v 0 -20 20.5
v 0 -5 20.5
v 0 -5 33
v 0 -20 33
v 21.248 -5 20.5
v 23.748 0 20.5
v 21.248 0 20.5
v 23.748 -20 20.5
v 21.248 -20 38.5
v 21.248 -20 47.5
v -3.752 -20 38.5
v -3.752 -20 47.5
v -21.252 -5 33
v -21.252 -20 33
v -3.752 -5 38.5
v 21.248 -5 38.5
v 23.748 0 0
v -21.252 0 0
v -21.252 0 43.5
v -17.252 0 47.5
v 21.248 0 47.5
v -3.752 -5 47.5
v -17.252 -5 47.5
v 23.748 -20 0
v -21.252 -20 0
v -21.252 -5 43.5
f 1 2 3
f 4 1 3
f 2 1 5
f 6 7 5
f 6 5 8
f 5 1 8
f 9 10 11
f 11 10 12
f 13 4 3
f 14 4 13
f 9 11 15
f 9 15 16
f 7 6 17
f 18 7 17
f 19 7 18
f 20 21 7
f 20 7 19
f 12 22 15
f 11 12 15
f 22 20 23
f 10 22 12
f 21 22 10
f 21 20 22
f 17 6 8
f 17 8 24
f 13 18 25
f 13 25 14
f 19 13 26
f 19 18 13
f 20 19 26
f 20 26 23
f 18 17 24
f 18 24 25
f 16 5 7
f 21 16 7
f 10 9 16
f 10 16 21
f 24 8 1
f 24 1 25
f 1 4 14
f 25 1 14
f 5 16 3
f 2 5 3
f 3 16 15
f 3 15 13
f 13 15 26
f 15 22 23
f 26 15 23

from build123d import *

# Parameters (mm, degrees)
PAD_DEPTH       = 20
SKETCH001_W     = 2.5
SKETCH001_H     = 27
POCKET_DEPTH    = 20.001
POCKET001_DEPTH = 15


with BuildPart() as part:
    # Sketch → Pad (new body)
    with BuildSketch(Plane.XZ):
        Polygon((23.748329, 0), (-21.251671, 0), (-21.251671, 43.5), (-17.251671, 47.5), (23.748329, 47.5), align=None)
    extrude(amount=PAD_DEPTH)

    # Sketch001 → Pocket (cut, through all)
    with BuildSketch(Plane.XZ.offset(20)):
        with Locations((22.498329, 34)):
            Rectangle(SKETCH001_W, SKETCH001_H)
    extrude(amount=-POCKET_DEPTH, mode=Mode.SUBTRACT)

    # Sketch002 → Pocket001 (cut)
    with BuildSketch(Plane.XZ.offset(20)):
        Polygon((21.248329, 20.5), (0, 20.5), (0, 33), (-21.251671, 33), (-21.251671, 47.5), (-3.751671, 47.5), (-3.751671, 38.5), (21.248329, 38.5), align=None)
    extrude(amount=-POCKET001_DEPTH, mode=Mode.SUBTRACT)


solid = part.part
